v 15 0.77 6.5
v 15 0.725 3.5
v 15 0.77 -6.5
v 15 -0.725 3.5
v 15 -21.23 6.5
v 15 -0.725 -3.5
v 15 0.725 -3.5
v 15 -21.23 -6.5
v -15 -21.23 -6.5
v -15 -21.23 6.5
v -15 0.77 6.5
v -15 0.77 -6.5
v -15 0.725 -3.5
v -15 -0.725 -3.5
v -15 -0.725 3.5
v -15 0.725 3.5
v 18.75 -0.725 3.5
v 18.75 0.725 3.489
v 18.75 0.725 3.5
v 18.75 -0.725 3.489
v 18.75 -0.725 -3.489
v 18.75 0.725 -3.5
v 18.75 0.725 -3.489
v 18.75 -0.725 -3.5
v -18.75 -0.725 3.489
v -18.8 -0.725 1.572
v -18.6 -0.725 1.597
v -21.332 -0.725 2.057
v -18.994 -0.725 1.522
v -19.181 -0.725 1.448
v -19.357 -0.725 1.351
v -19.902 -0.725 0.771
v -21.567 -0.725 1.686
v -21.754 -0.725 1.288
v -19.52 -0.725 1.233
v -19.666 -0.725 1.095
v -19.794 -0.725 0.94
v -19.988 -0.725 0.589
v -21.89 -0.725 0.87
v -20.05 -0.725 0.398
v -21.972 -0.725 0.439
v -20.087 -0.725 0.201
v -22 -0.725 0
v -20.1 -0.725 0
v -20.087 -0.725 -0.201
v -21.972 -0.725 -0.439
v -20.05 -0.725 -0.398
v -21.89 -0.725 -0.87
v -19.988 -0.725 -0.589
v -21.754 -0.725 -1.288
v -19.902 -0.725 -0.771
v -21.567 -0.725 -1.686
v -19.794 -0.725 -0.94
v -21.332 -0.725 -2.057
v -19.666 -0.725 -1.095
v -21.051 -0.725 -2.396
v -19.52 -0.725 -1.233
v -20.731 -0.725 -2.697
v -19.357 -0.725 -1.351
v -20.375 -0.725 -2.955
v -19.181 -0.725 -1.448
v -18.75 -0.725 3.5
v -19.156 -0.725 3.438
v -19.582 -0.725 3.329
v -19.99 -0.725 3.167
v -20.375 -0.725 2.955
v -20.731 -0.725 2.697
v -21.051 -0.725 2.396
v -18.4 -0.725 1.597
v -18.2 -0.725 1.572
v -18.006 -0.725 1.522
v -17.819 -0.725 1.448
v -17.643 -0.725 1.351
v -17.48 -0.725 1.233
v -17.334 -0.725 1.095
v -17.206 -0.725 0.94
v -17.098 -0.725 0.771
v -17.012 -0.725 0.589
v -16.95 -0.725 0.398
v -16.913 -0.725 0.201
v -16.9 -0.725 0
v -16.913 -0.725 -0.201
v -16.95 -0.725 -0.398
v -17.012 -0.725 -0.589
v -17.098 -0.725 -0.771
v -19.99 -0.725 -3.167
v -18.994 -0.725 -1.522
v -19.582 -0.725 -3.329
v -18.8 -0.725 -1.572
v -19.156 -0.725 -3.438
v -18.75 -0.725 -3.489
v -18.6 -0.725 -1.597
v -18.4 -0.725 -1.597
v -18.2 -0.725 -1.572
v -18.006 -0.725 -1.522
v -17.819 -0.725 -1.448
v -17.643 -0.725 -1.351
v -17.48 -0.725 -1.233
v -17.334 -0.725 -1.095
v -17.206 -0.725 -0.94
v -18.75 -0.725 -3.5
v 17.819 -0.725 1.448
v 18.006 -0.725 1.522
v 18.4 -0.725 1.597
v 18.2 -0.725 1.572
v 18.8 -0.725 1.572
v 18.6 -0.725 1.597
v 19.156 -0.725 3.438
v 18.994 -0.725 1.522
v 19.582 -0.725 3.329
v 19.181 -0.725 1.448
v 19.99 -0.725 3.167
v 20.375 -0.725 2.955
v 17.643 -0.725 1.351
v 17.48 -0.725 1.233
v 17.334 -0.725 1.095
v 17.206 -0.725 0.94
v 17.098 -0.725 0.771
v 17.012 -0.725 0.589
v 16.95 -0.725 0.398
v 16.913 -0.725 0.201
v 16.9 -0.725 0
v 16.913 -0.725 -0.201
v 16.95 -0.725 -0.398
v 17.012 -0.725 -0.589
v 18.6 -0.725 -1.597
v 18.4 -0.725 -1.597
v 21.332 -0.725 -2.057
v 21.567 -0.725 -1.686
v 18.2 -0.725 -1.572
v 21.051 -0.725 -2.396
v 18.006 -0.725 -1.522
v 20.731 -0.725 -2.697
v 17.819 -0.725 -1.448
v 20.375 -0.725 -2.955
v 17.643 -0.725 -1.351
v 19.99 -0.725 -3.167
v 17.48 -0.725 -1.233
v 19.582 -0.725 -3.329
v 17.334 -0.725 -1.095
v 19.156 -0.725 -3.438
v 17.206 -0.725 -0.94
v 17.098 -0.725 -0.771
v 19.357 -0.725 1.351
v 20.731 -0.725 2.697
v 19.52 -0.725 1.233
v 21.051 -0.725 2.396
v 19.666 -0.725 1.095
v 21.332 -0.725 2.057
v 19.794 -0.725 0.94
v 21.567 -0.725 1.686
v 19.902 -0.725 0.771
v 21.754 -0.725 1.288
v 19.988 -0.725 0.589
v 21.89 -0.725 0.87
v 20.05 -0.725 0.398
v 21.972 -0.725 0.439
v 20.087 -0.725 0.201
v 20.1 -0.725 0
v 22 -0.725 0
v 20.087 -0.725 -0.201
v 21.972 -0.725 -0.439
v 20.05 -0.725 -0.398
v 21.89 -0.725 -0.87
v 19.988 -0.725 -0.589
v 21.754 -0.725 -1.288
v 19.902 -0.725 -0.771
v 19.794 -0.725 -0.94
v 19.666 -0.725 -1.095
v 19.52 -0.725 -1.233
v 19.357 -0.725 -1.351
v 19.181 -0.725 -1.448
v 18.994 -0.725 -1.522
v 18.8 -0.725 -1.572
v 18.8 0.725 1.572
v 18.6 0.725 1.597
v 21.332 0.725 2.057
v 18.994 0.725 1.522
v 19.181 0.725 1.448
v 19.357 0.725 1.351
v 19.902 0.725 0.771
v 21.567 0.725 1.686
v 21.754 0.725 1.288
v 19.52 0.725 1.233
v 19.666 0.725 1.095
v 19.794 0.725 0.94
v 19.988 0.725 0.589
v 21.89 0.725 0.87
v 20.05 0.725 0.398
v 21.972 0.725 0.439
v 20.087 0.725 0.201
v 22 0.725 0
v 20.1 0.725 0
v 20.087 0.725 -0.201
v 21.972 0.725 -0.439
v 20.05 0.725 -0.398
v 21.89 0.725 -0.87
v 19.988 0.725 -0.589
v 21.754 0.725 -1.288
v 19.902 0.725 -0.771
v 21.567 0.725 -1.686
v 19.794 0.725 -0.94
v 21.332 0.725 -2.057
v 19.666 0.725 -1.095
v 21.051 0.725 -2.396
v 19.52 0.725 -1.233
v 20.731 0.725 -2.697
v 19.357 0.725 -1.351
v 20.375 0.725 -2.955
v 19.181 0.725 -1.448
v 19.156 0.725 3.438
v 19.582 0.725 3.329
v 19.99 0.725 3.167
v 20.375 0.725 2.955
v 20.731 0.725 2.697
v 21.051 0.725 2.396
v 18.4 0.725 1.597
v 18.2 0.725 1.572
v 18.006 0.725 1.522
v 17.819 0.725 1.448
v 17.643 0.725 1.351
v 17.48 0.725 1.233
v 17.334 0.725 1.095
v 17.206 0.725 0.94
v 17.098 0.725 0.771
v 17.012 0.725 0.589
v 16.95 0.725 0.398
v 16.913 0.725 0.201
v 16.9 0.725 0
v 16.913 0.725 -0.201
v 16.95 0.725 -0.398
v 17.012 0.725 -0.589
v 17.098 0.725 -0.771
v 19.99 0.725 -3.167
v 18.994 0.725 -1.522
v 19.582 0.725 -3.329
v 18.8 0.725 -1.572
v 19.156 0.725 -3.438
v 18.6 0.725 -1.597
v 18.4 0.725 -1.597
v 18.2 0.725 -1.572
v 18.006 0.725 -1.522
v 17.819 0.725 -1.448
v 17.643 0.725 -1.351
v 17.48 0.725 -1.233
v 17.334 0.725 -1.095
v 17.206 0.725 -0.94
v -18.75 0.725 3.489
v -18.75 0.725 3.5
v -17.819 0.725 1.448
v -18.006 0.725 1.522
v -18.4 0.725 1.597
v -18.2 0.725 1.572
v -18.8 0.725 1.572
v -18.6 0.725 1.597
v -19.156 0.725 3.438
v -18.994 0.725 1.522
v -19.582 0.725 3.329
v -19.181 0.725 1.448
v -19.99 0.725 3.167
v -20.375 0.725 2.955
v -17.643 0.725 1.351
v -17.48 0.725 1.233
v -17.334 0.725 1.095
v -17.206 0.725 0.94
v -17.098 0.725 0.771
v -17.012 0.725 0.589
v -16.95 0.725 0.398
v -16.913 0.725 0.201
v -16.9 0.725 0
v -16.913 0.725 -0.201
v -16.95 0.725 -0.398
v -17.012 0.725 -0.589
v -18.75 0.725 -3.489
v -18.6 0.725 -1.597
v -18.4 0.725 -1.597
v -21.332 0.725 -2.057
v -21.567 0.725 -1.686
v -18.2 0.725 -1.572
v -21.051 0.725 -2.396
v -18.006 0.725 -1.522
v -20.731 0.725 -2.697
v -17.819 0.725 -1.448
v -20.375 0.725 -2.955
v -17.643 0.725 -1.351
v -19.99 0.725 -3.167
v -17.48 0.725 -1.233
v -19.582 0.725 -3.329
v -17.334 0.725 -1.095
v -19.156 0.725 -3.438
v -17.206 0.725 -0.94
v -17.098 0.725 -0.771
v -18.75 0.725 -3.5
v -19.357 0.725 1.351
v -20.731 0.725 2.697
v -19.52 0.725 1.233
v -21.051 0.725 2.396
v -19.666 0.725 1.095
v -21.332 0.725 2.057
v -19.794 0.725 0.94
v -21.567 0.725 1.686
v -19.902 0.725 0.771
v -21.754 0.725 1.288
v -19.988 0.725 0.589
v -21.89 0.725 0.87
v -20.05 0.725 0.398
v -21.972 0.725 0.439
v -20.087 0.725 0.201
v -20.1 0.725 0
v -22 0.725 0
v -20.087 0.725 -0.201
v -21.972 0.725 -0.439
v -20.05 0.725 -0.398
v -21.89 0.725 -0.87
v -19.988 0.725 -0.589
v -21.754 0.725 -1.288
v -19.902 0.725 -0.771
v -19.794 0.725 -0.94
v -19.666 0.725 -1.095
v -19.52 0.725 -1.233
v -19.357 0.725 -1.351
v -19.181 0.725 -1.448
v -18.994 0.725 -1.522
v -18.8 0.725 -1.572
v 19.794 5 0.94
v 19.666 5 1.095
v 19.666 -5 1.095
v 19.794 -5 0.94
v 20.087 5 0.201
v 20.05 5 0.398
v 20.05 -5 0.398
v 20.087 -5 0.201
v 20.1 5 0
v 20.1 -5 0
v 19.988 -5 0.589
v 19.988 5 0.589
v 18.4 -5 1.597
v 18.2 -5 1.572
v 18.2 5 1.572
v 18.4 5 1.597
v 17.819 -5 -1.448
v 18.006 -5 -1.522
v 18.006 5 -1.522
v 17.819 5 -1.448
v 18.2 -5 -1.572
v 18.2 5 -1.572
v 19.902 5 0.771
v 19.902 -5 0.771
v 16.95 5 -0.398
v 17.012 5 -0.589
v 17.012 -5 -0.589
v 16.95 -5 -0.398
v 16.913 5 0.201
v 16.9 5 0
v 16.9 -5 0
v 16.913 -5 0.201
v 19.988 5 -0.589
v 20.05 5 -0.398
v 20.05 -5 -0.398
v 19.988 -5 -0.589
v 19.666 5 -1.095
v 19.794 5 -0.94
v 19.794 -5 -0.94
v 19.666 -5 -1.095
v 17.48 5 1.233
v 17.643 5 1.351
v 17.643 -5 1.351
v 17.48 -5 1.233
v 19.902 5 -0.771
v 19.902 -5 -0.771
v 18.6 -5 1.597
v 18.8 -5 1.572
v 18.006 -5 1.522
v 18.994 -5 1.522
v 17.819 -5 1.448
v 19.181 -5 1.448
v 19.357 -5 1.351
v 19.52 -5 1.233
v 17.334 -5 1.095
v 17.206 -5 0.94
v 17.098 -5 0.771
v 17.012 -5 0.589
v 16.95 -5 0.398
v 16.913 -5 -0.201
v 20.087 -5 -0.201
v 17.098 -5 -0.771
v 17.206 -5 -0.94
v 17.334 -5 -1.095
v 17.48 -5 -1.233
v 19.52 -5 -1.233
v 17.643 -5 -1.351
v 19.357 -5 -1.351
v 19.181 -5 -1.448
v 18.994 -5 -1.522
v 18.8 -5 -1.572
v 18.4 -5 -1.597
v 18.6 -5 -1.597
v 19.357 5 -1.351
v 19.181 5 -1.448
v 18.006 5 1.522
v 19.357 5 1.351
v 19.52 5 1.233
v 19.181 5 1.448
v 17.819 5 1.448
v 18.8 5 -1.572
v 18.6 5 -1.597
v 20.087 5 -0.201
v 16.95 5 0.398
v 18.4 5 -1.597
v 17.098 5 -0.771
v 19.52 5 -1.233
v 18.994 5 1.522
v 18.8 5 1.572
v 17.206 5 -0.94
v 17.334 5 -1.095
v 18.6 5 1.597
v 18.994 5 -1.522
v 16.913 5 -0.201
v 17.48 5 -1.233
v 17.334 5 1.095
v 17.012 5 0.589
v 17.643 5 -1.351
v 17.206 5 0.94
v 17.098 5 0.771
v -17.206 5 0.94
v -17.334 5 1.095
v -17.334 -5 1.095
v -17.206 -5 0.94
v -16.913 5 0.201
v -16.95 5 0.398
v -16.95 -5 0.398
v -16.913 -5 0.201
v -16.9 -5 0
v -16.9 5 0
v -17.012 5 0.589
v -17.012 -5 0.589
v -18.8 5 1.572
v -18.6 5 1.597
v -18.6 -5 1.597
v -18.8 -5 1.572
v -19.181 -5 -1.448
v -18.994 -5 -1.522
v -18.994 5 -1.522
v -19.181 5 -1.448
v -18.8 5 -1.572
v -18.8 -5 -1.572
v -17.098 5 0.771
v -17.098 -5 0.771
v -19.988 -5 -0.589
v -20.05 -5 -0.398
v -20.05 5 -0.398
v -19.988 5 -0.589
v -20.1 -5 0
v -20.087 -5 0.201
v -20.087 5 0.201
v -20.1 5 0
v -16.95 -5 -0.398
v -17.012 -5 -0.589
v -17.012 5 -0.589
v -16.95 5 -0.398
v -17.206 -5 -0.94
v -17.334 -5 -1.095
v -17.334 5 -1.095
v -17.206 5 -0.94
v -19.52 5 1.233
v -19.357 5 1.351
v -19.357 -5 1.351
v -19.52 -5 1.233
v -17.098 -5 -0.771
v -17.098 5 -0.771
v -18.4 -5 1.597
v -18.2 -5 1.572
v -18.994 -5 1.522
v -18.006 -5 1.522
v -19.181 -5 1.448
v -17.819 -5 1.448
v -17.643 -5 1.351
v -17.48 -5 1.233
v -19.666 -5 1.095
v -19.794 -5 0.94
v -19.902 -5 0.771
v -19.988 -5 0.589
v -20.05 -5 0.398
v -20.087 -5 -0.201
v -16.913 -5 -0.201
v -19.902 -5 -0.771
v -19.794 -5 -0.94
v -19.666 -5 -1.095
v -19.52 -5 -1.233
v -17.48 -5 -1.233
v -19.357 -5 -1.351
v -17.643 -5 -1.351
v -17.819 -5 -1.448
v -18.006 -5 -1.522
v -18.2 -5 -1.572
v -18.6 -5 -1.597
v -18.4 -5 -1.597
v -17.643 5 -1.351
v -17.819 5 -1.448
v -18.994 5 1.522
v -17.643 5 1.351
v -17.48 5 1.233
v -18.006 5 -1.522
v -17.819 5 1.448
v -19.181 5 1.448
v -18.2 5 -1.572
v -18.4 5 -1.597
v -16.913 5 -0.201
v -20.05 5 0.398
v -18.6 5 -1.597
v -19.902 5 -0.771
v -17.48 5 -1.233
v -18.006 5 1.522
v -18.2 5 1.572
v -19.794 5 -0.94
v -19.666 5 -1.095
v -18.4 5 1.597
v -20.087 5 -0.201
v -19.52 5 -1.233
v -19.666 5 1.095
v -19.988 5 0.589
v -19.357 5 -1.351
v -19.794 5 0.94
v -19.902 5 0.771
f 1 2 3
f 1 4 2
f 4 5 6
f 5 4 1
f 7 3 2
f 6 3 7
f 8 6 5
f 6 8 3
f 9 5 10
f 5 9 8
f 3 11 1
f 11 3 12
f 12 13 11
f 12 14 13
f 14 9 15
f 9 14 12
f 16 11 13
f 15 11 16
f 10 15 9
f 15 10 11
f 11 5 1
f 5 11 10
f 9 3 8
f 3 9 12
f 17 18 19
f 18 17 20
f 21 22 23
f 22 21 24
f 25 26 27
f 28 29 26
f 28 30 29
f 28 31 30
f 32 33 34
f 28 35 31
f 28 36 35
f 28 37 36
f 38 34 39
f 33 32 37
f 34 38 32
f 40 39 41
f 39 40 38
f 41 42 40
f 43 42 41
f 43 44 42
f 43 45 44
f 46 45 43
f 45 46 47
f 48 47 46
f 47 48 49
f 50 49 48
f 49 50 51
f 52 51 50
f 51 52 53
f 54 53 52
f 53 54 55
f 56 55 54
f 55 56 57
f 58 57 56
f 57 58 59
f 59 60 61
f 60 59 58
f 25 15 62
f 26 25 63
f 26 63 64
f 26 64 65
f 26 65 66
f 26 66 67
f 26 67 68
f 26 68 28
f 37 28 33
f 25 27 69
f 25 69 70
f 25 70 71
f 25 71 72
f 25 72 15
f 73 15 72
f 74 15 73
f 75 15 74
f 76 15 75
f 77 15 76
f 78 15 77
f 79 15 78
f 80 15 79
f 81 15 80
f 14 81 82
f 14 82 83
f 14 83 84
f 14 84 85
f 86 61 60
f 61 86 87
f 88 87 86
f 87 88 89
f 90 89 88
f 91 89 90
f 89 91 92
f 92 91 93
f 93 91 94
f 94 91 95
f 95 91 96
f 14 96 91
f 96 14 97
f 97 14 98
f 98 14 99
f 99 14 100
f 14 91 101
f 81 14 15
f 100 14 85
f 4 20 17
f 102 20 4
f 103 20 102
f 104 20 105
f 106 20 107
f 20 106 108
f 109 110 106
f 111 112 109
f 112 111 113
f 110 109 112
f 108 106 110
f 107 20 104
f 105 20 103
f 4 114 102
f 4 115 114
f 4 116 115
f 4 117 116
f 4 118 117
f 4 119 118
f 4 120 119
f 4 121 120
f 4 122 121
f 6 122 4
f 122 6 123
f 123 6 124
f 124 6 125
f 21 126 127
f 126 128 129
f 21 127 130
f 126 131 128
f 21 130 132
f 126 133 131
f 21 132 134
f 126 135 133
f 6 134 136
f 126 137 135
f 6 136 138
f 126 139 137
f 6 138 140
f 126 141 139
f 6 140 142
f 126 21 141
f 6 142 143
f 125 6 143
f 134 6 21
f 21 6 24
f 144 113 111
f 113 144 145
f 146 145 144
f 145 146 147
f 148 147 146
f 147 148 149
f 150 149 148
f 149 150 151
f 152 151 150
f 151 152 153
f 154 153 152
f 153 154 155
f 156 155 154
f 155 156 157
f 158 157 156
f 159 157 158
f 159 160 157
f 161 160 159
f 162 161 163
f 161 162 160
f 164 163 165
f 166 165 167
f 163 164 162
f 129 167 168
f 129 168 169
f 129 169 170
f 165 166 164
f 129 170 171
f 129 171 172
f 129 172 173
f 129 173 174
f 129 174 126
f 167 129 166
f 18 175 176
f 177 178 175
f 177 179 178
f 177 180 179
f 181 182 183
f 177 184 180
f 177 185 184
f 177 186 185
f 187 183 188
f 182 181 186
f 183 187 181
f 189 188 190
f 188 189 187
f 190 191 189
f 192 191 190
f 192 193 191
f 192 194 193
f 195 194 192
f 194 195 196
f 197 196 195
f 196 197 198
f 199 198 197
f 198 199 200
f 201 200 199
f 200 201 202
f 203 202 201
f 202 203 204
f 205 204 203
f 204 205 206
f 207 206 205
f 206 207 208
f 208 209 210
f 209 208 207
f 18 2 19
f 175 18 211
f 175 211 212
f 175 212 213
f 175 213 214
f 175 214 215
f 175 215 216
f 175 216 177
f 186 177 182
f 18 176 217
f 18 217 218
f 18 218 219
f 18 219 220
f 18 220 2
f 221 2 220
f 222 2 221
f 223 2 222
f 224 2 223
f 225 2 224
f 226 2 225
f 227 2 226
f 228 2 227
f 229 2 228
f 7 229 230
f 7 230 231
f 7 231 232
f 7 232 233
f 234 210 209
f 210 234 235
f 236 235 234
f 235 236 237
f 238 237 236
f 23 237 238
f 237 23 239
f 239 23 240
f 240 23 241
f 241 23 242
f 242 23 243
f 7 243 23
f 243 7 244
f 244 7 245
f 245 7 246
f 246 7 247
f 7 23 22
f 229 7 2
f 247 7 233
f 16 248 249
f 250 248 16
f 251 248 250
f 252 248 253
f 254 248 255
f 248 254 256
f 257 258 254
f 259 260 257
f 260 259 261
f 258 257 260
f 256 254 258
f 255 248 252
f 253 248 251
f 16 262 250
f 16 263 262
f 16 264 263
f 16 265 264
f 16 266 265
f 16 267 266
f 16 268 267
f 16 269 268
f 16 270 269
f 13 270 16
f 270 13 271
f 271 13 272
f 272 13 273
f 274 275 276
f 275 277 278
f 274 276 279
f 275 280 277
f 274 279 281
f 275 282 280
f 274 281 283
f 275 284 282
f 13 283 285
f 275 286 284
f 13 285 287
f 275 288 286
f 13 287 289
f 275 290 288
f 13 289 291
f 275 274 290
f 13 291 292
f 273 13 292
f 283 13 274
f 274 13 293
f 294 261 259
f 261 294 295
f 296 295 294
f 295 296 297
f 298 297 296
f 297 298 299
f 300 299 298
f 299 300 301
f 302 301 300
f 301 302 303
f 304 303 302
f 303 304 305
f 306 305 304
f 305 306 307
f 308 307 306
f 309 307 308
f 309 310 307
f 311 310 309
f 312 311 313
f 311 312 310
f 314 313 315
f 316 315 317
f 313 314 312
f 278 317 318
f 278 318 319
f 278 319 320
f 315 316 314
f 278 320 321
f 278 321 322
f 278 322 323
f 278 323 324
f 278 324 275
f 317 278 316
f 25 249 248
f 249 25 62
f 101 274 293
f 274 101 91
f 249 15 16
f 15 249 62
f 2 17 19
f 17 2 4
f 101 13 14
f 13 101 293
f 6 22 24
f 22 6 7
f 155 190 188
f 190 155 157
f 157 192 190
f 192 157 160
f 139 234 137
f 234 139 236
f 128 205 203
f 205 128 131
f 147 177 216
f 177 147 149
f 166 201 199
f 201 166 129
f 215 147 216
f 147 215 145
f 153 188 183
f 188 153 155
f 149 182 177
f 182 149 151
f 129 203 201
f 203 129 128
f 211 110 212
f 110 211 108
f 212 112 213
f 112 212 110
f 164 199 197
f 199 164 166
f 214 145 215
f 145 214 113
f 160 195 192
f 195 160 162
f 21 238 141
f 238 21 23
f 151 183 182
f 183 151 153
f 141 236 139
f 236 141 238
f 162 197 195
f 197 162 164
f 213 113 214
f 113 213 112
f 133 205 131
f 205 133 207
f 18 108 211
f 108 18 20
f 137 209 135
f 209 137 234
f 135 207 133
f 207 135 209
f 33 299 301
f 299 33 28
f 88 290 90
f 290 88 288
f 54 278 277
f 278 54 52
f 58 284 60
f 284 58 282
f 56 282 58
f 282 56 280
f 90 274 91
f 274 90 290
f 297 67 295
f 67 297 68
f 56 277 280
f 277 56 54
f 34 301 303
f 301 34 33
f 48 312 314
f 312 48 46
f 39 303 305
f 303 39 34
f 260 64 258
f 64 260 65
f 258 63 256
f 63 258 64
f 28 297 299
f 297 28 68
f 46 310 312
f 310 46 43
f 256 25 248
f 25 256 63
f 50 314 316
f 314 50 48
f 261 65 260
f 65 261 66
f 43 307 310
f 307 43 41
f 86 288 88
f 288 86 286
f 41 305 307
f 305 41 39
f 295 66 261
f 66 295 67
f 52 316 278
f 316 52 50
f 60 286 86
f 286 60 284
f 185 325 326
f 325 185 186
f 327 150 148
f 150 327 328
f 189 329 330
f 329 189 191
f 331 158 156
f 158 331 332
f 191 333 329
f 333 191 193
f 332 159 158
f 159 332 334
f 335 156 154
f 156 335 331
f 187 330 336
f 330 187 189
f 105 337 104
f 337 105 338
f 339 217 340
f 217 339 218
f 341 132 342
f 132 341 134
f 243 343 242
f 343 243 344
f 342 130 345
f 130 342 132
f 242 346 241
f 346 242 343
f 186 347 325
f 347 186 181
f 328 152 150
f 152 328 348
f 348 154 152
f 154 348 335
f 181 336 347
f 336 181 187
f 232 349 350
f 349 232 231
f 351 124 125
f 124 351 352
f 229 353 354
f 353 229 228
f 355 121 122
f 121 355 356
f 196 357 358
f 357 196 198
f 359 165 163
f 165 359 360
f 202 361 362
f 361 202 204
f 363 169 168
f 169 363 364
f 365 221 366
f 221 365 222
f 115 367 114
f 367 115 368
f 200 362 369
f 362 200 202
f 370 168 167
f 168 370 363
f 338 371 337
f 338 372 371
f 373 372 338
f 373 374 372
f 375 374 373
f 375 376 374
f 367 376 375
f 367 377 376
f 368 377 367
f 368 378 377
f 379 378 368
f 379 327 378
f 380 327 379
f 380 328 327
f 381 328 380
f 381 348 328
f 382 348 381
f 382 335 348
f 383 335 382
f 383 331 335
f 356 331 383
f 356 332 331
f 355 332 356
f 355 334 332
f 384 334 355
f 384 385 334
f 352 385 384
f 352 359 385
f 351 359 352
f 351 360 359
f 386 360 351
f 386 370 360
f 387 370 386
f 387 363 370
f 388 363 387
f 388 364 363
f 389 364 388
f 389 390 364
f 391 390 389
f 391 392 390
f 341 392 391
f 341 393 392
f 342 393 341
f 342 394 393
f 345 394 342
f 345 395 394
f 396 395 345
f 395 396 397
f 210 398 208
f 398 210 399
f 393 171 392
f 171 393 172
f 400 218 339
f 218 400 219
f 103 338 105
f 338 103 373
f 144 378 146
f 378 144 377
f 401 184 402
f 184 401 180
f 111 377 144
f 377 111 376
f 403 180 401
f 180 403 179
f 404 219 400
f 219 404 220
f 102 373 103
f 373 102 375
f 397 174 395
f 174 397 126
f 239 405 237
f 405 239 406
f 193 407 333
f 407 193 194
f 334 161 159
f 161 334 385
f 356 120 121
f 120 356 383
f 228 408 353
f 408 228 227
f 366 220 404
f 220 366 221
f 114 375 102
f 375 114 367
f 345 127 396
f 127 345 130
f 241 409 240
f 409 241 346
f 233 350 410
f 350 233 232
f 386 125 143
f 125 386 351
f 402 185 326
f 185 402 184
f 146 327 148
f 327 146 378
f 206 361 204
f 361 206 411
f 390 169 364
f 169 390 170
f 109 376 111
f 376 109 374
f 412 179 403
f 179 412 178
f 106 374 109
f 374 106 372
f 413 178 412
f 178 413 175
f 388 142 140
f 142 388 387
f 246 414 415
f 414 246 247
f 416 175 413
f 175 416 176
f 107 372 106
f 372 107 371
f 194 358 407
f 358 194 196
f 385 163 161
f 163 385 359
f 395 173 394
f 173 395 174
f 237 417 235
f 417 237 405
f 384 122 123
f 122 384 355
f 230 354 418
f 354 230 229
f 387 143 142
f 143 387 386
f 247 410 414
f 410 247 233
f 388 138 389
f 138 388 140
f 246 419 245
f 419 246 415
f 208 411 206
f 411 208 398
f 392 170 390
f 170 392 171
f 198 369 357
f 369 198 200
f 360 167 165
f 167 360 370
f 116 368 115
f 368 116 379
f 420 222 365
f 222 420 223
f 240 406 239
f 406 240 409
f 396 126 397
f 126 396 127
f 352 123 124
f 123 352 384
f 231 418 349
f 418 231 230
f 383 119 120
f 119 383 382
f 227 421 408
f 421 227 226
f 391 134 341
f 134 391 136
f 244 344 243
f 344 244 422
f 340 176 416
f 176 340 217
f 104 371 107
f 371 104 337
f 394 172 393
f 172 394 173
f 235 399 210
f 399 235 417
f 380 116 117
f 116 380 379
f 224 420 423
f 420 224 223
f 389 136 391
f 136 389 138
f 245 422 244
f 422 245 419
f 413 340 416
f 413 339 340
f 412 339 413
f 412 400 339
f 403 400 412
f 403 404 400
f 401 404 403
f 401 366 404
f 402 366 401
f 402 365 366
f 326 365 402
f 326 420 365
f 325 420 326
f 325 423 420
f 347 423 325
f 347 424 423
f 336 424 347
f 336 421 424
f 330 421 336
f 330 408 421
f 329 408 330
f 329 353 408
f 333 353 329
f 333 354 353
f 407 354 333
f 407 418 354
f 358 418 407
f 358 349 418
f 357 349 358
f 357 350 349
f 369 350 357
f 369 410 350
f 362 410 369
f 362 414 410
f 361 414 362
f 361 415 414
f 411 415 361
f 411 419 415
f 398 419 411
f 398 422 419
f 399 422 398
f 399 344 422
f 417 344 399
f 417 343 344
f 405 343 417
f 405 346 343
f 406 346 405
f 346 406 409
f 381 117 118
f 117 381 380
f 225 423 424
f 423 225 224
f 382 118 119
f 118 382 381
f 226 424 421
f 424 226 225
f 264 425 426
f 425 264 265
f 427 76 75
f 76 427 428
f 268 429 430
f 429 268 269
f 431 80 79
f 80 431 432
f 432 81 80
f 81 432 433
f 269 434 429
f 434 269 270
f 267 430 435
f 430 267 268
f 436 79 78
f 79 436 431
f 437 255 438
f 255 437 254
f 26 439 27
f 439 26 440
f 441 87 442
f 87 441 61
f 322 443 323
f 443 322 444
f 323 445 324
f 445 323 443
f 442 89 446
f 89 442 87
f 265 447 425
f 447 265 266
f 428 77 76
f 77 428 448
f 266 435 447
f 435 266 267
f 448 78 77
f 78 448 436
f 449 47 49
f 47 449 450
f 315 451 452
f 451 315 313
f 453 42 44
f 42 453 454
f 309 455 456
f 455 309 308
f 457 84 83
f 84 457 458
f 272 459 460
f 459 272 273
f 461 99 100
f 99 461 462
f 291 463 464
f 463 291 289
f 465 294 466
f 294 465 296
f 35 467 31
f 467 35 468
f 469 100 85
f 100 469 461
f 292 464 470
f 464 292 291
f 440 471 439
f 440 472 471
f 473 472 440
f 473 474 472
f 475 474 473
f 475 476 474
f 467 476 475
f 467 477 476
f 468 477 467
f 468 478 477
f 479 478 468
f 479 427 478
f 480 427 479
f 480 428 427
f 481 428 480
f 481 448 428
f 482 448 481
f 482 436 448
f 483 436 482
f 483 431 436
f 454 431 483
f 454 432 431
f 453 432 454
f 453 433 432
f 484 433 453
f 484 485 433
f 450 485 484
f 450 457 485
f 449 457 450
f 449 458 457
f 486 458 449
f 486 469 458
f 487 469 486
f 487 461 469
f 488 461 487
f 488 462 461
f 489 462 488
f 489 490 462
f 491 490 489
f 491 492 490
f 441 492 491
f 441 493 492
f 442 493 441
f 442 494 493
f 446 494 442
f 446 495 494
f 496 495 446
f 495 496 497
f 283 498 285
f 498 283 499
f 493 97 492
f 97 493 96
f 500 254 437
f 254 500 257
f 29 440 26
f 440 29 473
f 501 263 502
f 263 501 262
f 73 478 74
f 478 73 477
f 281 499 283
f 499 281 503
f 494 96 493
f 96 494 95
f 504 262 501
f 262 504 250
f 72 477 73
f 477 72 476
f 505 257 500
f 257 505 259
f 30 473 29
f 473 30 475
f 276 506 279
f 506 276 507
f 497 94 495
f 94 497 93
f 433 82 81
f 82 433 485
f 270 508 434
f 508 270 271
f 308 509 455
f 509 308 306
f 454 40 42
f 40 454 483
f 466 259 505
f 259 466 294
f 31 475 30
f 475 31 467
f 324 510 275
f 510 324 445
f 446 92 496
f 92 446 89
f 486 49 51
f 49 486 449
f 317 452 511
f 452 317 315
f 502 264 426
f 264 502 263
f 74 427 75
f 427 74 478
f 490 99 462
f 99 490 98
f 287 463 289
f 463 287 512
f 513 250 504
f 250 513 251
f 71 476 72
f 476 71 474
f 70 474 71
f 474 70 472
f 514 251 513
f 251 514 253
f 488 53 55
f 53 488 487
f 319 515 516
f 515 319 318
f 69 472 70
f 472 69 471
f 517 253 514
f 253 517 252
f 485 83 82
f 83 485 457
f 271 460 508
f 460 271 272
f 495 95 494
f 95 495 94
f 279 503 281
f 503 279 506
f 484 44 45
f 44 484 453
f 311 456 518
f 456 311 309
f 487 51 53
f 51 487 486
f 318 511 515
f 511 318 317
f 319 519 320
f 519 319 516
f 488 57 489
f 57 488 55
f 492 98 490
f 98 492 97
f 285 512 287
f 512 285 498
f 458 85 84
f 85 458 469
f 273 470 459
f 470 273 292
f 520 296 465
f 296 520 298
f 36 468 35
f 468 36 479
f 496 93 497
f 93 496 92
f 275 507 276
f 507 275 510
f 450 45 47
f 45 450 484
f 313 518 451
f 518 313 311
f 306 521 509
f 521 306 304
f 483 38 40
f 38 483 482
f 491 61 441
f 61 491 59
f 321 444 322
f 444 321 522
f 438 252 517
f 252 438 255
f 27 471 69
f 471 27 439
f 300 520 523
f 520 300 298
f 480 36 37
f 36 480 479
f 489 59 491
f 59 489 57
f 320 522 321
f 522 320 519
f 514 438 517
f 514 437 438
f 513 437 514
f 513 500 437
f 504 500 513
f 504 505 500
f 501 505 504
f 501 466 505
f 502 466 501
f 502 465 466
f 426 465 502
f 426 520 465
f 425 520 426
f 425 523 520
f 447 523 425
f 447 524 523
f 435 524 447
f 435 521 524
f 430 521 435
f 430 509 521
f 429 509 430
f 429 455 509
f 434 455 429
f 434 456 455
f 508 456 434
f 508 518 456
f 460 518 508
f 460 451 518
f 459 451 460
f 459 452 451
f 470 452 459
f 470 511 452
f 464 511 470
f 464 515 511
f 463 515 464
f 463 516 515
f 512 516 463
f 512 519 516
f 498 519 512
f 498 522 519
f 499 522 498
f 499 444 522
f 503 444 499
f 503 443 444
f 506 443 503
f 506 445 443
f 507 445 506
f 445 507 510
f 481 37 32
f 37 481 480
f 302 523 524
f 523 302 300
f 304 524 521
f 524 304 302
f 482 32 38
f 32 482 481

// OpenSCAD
$fn = 50;

module screwholes(){
    translate([18.5,0,0]){
        cylinder(10, d =3.2 ,center = true);
    }
     translate([-18.5,0,0]){
        cylinder(10, d=3.2 ,center = true);
    }

}
module longir(){
    rotate([90,0,0]){

        union(){
            translate([0,0,10.23]){
                cube([30,13,22], center = true);  
            }

            cube([37.5,7, 1.45], center = true);           
             translate([18.5,0,0]){
                    cylinder(1.45, d =7 ,center = true);
                }
                translate([-18.5,0,0]){
                    cylinder(1.45, d=7 ,center = true);
                }   

        }

        screwholes();
    
    }
}
longir();
